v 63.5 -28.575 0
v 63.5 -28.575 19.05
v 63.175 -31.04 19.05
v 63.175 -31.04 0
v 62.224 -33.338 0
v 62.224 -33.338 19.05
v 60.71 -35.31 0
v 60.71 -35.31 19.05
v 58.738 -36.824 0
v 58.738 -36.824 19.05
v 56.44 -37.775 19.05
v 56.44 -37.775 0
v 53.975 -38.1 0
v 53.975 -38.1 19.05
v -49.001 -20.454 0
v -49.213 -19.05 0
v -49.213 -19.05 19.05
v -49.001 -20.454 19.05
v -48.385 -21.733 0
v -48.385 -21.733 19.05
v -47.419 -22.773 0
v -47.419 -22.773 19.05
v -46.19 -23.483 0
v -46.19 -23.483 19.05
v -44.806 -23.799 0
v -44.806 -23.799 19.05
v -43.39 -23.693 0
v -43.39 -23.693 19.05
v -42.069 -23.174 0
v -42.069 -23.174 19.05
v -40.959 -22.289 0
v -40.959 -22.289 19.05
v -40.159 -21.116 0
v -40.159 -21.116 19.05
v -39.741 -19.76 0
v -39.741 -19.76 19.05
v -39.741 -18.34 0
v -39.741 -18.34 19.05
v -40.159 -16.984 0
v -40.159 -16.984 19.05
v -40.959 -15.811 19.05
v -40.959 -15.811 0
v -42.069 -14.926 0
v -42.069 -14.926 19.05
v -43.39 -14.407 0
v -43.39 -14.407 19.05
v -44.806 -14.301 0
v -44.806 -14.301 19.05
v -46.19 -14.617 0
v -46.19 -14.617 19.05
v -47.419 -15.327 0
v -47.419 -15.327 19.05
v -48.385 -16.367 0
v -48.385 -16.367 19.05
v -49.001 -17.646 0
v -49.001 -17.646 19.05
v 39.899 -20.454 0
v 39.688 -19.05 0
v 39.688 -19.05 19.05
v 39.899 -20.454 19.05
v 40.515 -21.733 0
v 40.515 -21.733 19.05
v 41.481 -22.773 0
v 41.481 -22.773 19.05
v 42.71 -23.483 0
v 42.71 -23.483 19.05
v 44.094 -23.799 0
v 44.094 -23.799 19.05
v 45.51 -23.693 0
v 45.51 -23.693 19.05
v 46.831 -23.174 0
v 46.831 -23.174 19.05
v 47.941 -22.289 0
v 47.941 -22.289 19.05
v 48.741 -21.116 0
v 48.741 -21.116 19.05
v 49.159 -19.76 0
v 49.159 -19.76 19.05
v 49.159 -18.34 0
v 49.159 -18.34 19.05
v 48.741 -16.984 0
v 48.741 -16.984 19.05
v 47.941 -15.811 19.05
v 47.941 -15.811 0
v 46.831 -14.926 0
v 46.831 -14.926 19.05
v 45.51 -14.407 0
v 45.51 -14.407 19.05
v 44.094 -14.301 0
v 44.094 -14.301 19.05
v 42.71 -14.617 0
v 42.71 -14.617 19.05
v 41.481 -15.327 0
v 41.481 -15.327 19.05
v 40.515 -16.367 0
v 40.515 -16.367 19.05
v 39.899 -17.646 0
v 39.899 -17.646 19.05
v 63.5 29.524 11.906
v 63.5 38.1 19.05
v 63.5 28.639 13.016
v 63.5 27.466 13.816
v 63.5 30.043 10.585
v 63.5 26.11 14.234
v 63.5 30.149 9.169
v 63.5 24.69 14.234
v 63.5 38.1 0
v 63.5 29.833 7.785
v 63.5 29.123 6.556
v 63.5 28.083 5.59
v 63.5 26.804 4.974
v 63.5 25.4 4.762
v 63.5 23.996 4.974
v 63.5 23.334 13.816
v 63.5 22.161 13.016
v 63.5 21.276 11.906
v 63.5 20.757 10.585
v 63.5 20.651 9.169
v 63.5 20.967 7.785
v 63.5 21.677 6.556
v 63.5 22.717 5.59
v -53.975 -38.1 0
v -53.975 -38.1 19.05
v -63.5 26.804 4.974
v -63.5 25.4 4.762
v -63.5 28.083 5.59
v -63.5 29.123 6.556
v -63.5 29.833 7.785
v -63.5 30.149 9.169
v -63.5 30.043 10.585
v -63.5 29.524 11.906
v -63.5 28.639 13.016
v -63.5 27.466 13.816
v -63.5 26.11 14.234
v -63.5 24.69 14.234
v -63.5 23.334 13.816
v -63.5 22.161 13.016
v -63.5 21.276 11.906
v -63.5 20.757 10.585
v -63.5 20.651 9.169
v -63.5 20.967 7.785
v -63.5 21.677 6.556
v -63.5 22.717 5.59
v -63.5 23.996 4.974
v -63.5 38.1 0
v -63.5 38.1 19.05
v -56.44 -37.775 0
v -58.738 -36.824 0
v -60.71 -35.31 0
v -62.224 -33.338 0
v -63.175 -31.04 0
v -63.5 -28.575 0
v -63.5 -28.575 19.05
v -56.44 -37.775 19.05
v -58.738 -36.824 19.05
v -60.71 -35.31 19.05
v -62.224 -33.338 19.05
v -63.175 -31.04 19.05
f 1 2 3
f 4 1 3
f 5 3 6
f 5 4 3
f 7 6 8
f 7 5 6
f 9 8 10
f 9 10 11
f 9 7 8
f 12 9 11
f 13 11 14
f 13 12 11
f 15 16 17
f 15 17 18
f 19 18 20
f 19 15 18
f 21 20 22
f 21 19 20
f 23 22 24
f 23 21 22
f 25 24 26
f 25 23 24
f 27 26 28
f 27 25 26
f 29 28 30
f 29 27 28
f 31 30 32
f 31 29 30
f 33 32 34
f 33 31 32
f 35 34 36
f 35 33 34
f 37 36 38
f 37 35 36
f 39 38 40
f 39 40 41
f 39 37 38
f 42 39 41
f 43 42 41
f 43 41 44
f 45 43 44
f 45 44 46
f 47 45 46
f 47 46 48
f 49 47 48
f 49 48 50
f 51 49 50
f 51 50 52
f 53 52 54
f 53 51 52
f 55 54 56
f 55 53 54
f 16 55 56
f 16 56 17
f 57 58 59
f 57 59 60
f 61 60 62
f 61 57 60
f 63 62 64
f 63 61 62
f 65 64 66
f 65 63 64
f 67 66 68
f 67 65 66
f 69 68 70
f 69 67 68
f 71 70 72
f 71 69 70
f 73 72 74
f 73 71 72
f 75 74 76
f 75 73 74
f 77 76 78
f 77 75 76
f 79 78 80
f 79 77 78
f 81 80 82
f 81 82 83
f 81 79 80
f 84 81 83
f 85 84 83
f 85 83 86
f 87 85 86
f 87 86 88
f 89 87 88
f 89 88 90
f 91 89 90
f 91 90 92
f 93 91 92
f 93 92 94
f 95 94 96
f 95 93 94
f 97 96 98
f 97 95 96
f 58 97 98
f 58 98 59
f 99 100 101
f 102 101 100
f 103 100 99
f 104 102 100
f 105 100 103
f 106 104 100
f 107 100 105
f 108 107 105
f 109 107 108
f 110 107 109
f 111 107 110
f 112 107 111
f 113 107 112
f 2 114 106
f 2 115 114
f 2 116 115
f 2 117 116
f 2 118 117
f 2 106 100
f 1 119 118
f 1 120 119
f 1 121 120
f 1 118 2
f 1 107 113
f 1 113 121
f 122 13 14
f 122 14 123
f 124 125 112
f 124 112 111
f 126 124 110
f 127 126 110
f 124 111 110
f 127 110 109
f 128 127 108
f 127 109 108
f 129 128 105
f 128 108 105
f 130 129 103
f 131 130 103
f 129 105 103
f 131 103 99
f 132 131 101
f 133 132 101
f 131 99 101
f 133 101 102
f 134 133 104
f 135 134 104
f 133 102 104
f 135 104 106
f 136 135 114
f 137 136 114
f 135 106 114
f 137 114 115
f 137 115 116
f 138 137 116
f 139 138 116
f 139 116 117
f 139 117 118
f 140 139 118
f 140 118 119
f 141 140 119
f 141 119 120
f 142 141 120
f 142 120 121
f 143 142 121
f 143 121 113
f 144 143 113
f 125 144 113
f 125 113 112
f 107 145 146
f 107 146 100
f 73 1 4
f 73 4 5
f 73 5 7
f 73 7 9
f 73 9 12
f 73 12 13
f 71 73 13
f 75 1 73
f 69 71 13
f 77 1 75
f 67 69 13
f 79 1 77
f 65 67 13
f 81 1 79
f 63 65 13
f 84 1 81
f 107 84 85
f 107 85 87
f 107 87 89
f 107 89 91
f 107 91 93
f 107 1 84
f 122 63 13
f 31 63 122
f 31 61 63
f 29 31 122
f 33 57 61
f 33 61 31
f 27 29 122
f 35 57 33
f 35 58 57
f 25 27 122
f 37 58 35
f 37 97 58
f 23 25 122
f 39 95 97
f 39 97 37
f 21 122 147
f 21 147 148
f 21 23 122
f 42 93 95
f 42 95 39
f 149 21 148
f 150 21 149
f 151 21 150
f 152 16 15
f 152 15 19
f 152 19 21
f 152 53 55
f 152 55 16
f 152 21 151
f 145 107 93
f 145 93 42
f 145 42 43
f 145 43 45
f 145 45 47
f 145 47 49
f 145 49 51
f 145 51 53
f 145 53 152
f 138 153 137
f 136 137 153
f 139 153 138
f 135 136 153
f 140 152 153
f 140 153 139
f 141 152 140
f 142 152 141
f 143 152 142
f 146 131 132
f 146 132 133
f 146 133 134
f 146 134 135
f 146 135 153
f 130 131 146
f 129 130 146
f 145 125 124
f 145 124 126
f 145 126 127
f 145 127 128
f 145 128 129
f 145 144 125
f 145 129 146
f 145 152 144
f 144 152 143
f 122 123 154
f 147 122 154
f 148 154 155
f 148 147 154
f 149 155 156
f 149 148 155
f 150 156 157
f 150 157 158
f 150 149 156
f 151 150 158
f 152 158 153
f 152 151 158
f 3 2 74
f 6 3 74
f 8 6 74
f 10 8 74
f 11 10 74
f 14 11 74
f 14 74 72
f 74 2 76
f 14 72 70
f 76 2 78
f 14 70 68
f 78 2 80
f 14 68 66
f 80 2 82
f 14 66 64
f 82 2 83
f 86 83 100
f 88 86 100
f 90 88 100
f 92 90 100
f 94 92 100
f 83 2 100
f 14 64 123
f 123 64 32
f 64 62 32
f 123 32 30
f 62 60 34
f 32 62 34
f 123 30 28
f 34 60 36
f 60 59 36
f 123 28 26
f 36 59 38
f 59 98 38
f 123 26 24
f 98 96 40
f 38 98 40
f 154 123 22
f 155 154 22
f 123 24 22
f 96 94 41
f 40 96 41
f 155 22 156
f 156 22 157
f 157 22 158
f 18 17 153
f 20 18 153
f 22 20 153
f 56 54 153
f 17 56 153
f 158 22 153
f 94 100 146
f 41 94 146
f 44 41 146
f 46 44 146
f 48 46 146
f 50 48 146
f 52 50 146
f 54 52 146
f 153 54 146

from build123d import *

# Parameters (mm, degrees)
SKETCH2_R           = 4.7625
BOSS_EXTRUDE1_DEPTH = 19.05
SKETCH3_R           = 4.7625
CUT_EXTRUDE1_DEPTH  = 139.7


with BuildPart() as part:
    # Sketch2 → Boss-Extrude1 (new body)
    with BuildSketch(Plane.XY):
        with BuildLine():
            Line((-63.5, 38.1), (63.5, 38.1))
            Line((63.5, 38.1), (63.5, -28.575))
            ThreePointArc((63.5, -28.575), (60.710192091, -35.310192091), (53.975, -38.1))
            Line((53.975, -38.1), (-53.975, -38.1))
            ThreePointArc((-53.975, -38.1), (-60.710192091, -35.310192091), (-63.5, -28.575))
            Line((-63.5, -28.575), (-63.5, 38.1))
        make_face()
        with Locations(Location((-44.45, -19.05, 0), (0, 0, 180))):
            Circle(SKETCH2_R, mode=Mode.SUBTRACT)
        with Locations(Location((44.45, -19.05, 0), (0, 0, 180))):
            Circle(SKETCH2_R, mode=Mode.SUBTRACT)
    extrude(amount=BOSS_EXTRUDE1_DEPTH)

    # Sketch3 → Cut-Extrude1 (cut)
    with BuildSketch(Plane(origin=(63.5, 0, 0), x_dir=(0, 0, -1), z_dir=(1, 0, 0))):
        with Locations((-9.525, 25.4)):
            Circle(SKETCH3_R)
    extrude(amount=-CUT_EXTRUDE1_DEPTH, mode=Mode.SUBTRACT)


solid = part.part
